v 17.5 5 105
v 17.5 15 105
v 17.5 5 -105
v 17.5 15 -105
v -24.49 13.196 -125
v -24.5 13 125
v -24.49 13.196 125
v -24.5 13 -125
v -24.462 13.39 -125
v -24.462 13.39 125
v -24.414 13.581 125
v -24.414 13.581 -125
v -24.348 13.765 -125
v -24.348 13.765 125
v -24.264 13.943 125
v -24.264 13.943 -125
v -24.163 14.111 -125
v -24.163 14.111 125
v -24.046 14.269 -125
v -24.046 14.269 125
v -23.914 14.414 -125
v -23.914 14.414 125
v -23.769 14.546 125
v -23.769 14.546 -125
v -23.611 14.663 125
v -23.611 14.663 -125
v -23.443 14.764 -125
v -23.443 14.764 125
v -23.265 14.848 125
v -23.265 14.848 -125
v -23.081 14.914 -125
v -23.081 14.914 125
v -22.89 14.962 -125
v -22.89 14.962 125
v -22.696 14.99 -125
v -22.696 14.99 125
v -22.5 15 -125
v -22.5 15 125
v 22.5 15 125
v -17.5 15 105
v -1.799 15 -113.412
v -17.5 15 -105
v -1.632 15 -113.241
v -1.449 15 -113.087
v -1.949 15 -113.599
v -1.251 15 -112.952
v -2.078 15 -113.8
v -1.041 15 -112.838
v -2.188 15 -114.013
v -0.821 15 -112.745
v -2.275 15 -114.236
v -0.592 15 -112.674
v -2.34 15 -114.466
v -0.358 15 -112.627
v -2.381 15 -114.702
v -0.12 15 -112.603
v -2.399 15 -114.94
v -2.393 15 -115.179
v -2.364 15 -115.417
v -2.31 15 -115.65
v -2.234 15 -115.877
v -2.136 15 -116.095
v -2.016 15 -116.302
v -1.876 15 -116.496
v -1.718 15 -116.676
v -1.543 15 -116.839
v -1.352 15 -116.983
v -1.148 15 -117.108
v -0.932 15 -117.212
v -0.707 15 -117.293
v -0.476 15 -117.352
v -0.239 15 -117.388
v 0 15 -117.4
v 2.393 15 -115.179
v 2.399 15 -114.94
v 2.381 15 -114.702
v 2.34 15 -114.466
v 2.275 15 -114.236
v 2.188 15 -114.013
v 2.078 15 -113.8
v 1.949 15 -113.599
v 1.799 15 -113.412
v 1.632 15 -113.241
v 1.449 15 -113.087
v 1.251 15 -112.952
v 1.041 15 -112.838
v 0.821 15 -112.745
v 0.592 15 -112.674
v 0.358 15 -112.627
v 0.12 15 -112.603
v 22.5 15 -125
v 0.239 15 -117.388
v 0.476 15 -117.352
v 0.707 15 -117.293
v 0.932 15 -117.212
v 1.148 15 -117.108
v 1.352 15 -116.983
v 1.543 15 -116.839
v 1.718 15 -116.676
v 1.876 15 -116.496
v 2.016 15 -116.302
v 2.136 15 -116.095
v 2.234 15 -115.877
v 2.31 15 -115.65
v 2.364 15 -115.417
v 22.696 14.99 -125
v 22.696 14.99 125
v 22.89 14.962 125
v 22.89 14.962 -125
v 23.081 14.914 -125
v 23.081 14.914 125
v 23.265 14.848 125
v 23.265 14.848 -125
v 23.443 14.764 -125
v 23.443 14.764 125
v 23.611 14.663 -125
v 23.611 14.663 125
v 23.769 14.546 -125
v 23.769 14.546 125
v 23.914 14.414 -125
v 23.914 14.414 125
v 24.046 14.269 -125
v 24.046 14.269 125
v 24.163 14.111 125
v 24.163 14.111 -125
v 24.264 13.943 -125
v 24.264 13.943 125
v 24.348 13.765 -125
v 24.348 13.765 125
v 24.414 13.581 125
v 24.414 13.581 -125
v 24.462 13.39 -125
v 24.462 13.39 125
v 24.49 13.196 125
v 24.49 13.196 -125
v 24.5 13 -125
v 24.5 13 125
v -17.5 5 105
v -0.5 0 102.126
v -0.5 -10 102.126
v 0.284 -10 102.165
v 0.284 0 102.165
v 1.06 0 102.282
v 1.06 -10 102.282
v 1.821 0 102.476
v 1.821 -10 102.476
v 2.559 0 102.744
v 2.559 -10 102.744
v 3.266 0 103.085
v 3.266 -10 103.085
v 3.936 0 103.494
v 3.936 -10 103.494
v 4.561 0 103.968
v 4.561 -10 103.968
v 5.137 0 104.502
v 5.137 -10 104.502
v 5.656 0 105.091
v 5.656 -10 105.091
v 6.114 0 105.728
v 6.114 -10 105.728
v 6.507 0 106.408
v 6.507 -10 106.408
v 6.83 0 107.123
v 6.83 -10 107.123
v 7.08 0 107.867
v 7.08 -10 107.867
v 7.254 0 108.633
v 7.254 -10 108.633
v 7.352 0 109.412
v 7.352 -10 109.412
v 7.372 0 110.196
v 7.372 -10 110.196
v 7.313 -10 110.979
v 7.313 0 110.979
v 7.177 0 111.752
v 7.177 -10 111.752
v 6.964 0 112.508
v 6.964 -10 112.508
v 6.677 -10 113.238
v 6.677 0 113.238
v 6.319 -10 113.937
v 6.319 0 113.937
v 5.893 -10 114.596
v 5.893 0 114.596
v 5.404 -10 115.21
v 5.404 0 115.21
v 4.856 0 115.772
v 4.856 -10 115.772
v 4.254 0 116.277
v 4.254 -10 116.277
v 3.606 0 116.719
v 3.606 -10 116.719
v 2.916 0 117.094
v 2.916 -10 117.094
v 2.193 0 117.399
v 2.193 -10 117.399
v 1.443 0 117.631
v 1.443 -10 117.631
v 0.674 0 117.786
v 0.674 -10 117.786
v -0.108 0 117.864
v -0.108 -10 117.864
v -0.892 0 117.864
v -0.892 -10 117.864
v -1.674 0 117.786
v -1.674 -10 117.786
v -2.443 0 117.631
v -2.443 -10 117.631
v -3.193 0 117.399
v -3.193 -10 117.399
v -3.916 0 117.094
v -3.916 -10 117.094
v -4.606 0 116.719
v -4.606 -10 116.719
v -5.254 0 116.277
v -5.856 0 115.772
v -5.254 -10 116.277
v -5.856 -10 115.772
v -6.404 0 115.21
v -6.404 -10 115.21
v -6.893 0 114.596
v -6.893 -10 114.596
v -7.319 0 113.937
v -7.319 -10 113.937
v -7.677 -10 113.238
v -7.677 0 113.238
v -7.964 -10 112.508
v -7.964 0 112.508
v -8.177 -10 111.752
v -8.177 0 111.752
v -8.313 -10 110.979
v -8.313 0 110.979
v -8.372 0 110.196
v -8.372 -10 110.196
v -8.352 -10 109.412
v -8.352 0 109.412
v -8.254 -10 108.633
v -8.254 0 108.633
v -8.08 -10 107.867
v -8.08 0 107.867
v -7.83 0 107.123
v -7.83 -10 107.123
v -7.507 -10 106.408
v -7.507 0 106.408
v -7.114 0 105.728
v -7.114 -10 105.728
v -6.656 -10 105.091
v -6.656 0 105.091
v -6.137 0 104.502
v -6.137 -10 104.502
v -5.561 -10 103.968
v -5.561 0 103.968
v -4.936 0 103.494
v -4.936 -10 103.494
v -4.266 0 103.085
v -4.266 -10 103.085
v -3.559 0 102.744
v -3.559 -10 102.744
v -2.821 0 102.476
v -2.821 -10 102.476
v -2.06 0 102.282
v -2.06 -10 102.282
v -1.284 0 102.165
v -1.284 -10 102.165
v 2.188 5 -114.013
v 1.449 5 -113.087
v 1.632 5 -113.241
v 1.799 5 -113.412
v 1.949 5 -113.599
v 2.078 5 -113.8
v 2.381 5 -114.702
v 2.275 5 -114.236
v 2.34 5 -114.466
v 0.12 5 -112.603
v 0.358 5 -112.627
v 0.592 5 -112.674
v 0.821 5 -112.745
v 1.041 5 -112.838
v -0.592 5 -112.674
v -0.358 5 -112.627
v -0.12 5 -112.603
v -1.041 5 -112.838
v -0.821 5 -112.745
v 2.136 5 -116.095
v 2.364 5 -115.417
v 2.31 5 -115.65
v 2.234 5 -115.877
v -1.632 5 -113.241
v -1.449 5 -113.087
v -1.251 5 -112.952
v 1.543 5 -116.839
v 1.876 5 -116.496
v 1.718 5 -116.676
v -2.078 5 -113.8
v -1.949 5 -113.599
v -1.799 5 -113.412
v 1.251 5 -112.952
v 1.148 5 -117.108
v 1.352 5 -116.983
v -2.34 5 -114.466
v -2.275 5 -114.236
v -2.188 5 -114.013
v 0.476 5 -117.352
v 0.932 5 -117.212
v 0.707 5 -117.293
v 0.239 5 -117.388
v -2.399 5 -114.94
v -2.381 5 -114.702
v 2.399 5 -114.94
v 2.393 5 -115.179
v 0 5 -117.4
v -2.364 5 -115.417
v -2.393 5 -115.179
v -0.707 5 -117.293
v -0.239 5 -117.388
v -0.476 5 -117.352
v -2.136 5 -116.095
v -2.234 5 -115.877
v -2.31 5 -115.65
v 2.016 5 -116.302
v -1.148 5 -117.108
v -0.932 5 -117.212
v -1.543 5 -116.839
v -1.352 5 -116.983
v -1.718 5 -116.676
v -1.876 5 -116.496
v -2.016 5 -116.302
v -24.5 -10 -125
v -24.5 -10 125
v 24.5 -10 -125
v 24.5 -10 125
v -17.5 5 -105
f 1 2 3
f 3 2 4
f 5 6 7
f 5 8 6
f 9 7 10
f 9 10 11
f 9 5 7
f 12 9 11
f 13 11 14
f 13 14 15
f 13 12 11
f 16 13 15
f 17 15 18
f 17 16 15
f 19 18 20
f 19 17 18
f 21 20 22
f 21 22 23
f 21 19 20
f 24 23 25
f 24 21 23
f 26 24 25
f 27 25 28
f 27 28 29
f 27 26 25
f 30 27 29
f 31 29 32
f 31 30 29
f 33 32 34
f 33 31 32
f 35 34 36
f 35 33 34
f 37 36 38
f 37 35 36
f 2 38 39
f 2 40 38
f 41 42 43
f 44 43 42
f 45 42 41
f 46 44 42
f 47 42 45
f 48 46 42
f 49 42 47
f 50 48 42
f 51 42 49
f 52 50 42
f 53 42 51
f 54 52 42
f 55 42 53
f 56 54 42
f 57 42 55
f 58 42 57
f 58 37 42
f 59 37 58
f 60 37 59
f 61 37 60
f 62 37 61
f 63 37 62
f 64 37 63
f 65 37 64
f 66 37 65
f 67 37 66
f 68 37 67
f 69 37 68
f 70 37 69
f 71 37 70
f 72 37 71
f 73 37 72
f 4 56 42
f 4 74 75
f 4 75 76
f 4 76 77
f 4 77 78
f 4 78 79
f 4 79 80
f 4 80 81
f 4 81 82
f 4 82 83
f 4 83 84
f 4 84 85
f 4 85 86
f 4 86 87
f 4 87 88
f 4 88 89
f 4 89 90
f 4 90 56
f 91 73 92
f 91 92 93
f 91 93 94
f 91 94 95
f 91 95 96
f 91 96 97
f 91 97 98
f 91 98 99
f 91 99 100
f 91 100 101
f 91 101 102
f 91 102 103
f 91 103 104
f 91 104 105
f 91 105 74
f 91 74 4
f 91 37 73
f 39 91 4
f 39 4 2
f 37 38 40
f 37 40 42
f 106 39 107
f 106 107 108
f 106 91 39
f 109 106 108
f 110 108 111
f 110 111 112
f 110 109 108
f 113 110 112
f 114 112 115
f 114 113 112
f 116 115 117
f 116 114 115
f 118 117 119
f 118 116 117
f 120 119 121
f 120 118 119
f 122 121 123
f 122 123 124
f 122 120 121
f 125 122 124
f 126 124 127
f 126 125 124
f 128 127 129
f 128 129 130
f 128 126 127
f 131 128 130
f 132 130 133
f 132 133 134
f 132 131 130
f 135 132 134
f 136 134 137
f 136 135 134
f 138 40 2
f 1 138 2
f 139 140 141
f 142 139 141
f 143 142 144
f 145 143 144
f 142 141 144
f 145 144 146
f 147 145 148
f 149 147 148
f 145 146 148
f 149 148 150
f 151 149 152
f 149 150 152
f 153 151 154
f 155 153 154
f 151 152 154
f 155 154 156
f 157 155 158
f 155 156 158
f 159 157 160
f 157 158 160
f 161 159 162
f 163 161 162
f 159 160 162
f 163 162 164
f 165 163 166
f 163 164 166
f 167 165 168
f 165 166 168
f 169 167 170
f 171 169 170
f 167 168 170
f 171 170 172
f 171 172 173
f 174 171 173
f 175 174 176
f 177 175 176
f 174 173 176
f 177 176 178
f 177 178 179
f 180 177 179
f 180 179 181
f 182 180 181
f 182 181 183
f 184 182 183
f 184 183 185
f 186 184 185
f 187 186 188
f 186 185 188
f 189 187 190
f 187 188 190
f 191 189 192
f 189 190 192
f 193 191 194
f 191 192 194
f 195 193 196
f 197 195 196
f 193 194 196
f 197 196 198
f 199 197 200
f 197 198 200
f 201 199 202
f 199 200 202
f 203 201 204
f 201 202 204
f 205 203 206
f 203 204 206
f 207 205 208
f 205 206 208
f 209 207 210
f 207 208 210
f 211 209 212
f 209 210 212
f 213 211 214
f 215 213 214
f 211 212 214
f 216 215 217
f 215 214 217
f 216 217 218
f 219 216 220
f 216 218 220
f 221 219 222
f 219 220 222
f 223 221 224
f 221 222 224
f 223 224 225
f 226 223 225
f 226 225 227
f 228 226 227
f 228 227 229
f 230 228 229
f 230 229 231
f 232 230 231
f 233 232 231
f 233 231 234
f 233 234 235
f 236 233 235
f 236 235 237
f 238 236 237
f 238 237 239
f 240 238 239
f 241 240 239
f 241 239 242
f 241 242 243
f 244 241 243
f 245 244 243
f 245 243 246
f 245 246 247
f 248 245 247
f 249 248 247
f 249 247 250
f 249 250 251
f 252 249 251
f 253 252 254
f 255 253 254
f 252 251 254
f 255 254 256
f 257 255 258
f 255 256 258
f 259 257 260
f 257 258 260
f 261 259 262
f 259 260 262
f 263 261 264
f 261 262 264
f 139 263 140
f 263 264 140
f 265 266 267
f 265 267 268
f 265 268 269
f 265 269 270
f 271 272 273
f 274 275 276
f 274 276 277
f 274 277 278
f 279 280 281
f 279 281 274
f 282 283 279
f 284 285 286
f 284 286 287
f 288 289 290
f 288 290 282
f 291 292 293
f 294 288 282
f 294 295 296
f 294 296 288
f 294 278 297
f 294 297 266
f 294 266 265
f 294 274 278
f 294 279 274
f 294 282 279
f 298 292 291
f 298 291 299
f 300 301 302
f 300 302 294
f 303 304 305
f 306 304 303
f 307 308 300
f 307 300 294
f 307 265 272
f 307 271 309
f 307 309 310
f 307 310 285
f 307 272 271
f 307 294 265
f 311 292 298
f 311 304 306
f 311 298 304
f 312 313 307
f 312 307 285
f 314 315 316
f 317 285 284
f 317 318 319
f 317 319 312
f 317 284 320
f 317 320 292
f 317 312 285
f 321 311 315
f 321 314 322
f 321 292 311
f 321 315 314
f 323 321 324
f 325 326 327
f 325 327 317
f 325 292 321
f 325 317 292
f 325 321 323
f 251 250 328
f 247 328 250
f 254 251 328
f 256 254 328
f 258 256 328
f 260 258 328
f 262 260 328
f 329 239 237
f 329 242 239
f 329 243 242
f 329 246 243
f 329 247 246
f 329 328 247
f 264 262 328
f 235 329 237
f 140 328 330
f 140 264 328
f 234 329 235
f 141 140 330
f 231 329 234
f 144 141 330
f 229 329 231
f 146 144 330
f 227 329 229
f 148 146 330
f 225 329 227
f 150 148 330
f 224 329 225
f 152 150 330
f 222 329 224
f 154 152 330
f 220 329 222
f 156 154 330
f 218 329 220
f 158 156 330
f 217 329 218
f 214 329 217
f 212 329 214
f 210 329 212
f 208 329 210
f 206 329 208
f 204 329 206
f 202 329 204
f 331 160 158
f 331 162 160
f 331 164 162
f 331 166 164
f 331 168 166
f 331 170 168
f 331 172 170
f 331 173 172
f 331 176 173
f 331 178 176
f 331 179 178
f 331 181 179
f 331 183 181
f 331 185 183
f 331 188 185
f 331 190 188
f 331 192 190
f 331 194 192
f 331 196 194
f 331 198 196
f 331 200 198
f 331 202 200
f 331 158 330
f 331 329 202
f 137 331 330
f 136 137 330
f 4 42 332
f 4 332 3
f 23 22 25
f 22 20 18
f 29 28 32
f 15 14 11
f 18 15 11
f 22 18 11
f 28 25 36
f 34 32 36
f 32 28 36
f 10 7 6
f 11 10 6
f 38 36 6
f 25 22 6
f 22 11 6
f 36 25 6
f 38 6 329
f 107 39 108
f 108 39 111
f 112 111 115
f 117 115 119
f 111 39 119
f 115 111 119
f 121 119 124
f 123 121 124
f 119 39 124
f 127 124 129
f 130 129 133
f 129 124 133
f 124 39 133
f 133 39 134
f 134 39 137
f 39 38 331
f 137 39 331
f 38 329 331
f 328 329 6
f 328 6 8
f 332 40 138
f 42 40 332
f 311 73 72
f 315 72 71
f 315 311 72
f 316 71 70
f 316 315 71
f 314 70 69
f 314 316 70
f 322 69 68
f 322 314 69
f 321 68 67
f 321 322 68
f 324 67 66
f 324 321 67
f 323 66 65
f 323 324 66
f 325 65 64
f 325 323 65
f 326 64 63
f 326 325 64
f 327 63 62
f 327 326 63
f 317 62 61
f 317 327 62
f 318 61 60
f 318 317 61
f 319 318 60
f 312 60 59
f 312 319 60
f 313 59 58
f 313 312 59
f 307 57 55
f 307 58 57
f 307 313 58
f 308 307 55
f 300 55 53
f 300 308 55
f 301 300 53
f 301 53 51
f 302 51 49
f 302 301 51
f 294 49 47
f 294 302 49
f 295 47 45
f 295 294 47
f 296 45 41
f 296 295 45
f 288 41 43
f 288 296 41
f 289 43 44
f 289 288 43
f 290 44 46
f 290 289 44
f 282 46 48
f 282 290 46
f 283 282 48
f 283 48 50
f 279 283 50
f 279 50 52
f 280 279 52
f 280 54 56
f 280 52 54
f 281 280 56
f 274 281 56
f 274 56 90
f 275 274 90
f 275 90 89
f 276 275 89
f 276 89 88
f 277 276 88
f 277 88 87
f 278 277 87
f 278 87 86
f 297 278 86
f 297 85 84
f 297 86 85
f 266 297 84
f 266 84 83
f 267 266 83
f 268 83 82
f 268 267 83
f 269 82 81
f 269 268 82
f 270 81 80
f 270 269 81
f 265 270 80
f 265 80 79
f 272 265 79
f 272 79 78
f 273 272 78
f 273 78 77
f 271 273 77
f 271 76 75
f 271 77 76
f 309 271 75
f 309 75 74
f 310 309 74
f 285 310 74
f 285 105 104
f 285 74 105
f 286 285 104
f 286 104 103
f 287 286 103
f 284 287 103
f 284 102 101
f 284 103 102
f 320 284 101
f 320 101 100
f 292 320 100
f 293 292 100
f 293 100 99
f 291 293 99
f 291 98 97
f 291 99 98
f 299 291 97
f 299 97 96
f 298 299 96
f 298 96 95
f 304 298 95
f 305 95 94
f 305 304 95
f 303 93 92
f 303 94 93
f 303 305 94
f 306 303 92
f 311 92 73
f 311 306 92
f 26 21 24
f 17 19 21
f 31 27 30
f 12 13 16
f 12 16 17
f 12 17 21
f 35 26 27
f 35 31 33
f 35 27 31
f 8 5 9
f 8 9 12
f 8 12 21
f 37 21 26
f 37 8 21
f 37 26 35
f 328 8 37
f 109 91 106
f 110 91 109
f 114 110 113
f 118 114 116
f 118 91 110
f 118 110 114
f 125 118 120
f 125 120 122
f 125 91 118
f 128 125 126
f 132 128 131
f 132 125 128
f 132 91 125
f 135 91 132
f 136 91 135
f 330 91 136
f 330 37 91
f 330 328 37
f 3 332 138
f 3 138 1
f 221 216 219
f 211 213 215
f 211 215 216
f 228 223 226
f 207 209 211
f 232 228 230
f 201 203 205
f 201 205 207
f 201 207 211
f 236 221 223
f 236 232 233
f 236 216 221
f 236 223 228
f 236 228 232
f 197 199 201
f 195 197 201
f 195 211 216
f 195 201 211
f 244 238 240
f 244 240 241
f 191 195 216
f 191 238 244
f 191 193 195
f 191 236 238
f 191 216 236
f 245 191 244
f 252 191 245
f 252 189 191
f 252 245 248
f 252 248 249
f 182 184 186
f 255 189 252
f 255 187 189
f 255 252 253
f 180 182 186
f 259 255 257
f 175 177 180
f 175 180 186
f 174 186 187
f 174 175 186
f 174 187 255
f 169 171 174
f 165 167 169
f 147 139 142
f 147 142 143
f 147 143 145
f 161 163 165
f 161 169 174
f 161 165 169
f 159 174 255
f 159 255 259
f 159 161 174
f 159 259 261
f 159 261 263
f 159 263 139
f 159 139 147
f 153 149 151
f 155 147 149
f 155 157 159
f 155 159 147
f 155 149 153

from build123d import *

# Parameters (mm, degrees)
SKETCH1_W               = 49
SKETCH1_H               = 20
BOSS_EXTRUDE1_DEPTH     = 125
SKETCH3_W               = 49
SKETCH3_H               = 250
BOSS_EXTRUDE2_DEPTH     = 5
CUT_EXTRUDE1_DEPTH      = 130.808512818
CUT_EXTRUDE1_DEPTH_BACK = 10
SKETCH2_R               = 2.4
SKETCH5_W               = 35
SKETCH5_H               = 210
CUT_EXTRUDE3_DEPTH      = 10
FILLET1_R               = 2
SKETCH4_R               = 7.874
CUT_EXTRUDE2_DEPTH      = 10


with BuildPart() as part:
    # Sketch1 → Boss-Extrude1 (new, symmetric)
    with BuildSketch(Plane.XY):
        Rectangle(SKETCH1_W, SKETCH1_H)
    extrude(amount=BOSS_EXTRUDE1_DEPTH, both=True)

    # Sketch3 → Boss-Extrude2 (add)
    with BuildSketch(Plane(origin=(0, 10, 0), x_dir=(1, 0, 0), z_dir=(0, 1, 0))):
        Rectangle(SKETCH3_W, SKETCH3_H)
    extrude(amount=BOSS_EXTRUDE2_DEPTH)

    # Sketch2 → Cut-Extrude1 (cut, two sides: drawn at the far end of the back side and taken through both)
    with BuildSketch(Plane(origin=(0, 15, 0), x_dir=(1, 0, 0), z_dir=(0, 1, 0)).offset(-CUT_EXTRUDE1_DEPTH_BACK)):
        with Locations(Location((0, 115, 0), (0, 0, 90))):
            Circle(SKETCH2_R)
    extrude(amount=CUT_EXTRUDE1_DEPTH + CUT_EXTRUDE1_DEPTH_BACK, mode=Mode.SUBTRACT)

    # Sketch5 → Cut-Extrude3 (cut)
    with BuildSketch(Plane(origin=(0, 15, 0), x_dir=(1, 0, 0), z_dir=(0, 1, 0))):
        Rectangle(SKETCH5_W, SKETCH5_H)
    extrude(amount=-CUT_EXTRUDE3_DEPTH, mode=Mode.SUBTRACT)

    # Fillet1
    fillet1_edges = [part.edges().sort_by_distance(p)[0] for p in [
        (-24.5, 15, 0),
        (24.5, 15, 0),
    ]]
    fillet(fillet1_edges, radius=FILLET1_R)

    # Sketch4 → Cut-Extrude2 (cut)
    with BuildSketch(Plane.XZ.offset(10)):
        with Locations(Location((-0.5, 110, 0), (0, 0, 270))):
            Circle(SKETCH4_R)
    extrude(amount=-CUT_EXTRUDE2_DEPTH, mode=Mode.SUBTRACT)


solid = part.part
